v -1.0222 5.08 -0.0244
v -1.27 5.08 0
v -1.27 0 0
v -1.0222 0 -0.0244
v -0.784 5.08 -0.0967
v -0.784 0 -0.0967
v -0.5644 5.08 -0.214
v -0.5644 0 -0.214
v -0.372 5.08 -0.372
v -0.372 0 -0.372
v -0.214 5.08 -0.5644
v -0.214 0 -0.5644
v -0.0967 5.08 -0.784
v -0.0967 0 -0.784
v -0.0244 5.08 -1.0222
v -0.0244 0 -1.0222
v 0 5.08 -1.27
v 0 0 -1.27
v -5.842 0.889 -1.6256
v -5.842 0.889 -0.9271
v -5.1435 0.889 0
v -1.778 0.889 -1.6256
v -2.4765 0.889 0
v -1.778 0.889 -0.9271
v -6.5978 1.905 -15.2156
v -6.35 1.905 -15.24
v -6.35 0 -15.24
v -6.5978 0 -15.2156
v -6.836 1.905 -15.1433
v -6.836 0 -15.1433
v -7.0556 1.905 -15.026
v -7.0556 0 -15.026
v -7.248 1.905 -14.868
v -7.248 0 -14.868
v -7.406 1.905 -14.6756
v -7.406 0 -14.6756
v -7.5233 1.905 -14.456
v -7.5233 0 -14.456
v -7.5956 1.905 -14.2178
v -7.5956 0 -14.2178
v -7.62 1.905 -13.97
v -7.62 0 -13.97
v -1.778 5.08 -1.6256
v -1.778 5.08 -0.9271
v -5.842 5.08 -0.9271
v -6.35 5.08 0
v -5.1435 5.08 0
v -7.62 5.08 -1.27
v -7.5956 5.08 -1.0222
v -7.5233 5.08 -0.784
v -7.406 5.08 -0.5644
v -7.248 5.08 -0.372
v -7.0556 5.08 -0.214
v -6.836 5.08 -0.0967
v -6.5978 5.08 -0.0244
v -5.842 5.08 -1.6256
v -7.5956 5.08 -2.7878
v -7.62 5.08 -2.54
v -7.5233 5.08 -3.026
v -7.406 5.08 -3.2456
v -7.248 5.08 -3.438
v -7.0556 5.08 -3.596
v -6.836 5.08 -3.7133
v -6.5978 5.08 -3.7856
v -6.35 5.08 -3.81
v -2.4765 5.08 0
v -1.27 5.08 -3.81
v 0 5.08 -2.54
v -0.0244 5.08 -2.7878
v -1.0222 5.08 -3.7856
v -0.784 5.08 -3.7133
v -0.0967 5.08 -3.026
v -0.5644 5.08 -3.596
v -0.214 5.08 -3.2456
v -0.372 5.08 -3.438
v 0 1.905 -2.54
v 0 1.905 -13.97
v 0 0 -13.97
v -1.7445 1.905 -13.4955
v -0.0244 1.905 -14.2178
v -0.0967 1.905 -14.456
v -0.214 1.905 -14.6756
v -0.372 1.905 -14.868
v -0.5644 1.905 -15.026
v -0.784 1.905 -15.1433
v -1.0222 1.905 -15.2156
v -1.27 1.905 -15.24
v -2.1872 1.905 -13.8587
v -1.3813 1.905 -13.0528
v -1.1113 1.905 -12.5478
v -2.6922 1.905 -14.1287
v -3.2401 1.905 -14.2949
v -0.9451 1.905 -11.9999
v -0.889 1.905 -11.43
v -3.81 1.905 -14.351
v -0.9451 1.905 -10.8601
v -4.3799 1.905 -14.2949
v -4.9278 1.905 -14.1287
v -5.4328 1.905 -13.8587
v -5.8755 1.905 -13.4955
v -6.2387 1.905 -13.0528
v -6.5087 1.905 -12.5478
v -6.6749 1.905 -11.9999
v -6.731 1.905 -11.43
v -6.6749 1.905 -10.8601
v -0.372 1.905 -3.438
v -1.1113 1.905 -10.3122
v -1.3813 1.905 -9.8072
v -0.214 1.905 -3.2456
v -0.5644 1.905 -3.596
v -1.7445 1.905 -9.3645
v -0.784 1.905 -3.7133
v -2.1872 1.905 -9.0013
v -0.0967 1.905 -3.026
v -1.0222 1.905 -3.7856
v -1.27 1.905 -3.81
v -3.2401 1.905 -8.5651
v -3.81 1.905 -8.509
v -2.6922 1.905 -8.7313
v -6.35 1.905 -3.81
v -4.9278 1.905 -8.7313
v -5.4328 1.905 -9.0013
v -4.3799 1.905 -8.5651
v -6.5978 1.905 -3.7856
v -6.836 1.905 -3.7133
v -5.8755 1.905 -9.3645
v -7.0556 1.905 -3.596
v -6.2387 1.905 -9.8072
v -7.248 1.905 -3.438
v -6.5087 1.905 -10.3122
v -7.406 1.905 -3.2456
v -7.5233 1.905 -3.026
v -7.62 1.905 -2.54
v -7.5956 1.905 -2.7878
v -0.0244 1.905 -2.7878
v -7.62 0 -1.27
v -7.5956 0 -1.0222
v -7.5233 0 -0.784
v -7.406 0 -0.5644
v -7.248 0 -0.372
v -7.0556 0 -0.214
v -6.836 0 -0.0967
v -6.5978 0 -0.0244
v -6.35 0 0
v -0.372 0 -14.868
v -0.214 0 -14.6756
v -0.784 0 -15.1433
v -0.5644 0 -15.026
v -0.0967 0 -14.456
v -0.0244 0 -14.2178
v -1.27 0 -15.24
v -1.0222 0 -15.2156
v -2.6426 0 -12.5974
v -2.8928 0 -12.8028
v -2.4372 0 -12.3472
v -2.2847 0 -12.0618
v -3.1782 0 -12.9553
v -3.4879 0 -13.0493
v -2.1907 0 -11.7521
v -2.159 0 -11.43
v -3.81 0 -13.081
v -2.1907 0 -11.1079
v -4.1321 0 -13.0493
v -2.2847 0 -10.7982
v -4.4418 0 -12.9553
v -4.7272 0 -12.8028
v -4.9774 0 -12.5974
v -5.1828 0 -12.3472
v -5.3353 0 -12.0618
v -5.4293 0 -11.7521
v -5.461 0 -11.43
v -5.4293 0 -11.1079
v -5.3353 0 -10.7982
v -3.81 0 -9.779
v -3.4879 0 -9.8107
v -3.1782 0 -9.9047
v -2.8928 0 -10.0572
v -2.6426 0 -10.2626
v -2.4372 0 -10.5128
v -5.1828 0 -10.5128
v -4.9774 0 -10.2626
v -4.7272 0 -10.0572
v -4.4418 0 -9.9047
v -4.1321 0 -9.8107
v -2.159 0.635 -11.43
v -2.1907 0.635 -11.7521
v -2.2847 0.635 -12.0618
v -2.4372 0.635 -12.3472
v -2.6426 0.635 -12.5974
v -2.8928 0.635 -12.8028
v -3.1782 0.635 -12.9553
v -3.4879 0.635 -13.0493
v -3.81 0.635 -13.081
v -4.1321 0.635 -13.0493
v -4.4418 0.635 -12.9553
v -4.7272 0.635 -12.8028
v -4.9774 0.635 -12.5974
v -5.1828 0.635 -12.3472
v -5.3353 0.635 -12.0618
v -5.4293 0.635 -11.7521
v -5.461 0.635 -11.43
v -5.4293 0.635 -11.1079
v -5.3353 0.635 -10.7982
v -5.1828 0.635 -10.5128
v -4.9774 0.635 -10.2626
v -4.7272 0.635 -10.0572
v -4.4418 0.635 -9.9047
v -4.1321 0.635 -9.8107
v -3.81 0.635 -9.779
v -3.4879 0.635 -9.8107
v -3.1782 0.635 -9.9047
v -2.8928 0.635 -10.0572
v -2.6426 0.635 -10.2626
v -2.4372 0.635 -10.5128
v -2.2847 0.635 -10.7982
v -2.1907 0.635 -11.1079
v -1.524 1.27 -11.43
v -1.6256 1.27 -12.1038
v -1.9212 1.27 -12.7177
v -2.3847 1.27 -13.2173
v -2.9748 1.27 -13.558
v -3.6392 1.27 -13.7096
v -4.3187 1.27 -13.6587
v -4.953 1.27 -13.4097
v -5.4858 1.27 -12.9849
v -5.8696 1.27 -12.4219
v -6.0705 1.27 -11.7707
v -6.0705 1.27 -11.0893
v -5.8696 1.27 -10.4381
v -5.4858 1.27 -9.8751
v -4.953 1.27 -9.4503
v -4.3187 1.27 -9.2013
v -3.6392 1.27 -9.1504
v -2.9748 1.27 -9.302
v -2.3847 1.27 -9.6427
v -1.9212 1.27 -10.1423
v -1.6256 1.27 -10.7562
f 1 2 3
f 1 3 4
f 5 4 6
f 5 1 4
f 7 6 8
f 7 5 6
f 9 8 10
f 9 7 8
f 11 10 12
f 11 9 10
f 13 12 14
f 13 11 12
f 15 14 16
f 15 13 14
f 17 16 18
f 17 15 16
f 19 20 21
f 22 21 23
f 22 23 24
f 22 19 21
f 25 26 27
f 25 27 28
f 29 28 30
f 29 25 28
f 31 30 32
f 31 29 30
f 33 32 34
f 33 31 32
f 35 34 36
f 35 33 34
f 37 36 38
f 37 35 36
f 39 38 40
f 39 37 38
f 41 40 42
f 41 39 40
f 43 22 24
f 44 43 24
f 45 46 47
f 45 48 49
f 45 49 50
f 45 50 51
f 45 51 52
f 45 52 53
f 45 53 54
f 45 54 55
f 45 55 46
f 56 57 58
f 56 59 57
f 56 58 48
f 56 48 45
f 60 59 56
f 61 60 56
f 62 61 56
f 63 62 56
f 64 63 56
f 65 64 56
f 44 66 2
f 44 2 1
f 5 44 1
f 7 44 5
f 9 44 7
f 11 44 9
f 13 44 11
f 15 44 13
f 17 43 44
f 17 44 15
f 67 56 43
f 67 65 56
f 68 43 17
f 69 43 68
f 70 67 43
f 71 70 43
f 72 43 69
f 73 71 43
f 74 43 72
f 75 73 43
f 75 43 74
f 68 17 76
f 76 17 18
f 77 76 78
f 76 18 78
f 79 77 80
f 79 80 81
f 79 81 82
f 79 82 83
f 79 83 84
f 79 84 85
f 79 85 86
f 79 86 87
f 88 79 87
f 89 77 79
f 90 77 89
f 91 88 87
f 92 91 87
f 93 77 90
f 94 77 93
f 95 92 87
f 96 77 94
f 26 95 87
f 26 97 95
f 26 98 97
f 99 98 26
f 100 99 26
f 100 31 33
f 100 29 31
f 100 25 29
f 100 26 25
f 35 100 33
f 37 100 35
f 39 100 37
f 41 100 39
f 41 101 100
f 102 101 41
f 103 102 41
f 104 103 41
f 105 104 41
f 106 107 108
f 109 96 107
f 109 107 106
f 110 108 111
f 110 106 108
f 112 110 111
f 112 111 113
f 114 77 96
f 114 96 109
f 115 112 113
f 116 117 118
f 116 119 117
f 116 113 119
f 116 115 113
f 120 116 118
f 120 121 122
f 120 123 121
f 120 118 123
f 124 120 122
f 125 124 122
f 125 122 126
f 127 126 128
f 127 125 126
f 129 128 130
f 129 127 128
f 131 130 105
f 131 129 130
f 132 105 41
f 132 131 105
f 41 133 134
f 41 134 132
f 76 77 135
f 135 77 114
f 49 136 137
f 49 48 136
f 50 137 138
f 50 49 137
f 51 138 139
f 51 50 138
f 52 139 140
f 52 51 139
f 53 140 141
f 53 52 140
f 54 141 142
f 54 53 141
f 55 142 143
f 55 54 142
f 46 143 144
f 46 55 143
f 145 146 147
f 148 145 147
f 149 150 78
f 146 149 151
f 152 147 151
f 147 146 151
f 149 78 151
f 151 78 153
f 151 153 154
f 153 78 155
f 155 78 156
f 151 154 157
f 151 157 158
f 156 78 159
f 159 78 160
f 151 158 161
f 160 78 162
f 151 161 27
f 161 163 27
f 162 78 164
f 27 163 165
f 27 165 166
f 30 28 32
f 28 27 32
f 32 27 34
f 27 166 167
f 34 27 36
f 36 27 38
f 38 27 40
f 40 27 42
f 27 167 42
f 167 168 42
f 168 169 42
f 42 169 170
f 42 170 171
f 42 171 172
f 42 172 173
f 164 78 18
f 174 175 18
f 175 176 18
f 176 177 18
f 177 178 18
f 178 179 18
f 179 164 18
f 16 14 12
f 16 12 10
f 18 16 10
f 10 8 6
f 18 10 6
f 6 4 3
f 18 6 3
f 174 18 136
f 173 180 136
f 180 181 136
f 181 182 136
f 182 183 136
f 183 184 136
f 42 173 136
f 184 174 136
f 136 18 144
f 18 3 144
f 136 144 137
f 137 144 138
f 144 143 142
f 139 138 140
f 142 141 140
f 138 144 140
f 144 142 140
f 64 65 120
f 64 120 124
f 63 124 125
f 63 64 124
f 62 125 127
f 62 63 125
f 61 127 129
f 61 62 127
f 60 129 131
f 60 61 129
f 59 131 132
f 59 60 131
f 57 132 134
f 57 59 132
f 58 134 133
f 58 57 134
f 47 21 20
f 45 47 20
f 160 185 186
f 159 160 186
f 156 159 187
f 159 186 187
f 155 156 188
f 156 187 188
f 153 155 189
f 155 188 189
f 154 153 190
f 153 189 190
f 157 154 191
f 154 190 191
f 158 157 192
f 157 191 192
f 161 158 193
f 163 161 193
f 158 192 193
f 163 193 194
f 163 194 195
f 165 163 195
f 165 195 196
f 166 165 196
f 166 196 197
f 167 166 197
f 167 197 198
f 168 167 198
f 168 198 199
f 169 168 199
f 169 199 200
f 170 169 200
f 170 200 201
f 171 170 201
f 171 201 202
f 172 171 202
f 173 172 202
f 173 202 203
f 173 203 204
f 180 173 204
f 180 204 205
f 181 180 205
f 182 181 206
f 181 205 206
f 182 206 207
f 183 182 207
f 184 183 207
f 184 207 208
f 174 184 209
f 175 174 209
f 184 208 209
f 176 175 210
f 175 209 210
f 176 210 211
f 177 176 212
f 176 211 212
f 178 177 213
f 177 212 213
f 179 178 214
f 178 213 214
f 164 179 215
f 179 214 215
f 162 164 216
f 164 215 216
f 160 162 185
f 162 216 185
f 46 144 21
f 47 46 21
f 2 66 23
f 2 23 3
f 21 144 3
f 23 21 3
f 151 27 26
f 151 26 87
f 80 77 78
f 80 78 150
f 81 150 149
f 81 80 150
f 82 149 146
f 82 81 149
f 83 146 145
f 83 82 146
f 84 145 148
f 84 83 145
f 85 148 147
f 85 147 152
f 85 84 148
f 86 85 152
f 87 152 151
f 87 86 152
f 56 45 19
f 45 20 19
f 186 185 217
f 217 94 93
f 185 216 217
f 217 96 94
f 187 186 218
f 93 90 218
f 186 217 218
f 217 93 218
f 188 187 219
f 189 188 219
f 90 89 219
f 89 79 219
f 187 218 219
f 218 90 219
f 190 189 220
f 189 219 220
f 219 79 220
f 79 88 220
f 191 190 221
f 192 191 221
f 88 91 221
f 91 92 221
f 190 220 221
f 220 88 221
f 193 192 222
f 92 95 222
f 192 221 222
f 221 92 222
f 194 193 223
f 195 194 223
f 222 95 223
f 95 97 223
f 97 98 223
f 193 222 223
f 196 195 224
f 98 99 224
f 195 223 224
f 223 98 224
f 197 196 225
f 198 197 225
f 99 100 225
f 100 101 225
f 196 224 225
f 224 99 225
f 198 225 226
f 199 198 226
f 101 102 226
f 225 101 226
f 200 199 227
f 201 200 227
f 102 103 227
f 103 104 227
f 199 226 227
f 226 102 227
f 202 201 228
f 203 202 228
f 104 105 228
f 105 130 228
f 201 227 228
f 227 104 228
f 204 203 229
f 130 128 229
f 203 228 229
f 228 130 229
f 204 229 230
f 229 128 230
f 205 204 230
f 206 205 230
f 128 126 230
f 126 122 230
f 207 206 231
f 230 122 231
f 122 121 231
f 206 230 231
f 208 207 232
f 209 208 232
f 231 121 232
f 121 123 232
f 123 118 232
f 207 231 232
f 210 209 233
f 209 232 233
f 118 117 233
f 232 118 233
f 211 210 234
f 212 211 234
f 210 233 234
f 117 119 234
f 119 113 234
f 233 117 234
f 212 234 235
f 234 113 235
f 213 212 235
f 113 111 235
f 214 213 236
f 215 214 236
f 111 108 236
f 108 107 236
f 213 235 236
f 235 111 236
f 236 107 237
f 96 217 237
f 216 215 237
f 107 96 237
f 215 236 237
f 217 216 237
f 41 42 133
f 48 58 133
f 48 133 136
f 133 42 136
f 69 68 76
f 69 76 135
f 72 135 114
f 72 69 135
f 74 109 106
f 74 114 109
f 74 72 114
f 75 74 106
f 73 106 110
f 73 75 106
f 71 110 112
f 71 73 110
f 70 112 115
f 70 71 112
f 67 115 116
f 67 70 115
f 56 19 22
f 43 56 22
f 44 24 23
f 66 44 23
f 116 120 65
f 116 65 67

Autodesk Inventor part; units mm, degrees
ref_plane "YZ Plane" through (0, 0, 0) normal (1, 0, 0) x (0, 1, 0)
ref_plane "XZ Plane" through (0, 0, 0) normal (0, 1, 0) x (-1, 0, 0)
ref_plane "XY Plane" through (0, 0, 0) normal (0, 0, 1) x (1, 0, 0)
sketch "Sketch1" plane through (0, 0, 0) normal (0, 1, 0) x (-1, 0, 0)
  line L0 (0, 0) -> (7.62, 0)
  line L1 (7.62, 0) -> (7.62, -15.24)
  line L2 (7.62, -15.24) -> (0, -15.24)
  line L3 (0, -15.24) -> (0, 0)
  dimension "d0" = 7.62
  dimension "d1" = 15.24
extrude "Extrusion1" add sketch "Sketch1" along normal blind 1.905
sketch "Sketch4" plane through (0, 1.905, 0) normal (0, 1, 0) x (1, 0, 0)
  line L0 (0, 15.24) -> (-7.62, 15.24) projected
  circle A0 centre (-3.81, 11.43) radius 1.651
  point P0 (0, 0)
  point P1 (-3.81, 15.24)
  dimension "d9" = 3.302
  dimension "d10" = 3.81
extrude "Extrusion3" cut sketch "Sketch4" against normal through all
chamfer "Chamfer1" distance 1.27 angle 45 1 edges at (-5.461, 1.905, -11.43)
sketch "Sketch5" plane through (0, 1.905, 0) normal (0, 1, 0) x (1, 0, 0)
  line L0 (-7.62, 0) -> (0, 0) projected
  line L1 (0, 0) -> (0, 15.24) projected
  line L2 (0, 15.24) -> (-7.62, 15.24) projected
  line L3 (-7.62, 15.24) -> (-7.62, 0) projected
  circle A0 centre (-3.81, 11.43) radius 2.921 projected
  line L4 (0, 0) -> (-7.62, 0) projected
  line L5 (-5.1435, 0) -> (-5.842, 0.9271)
  line L6 (-5.842, 0.9271) -> (-5.842, 1.6256)
  line L7 (-5.842, 1.6256) -> (-1.778, 1.6256)
  line L8 (-1.778, 1.6256) -> (-1.778, 0.9271)
  line L9 (-1.778, 0.9271) -> (-2.4765, 0)
  line L10 (-7.62, 0) -> (-7.62, 15.24) projected
  line L11 (-7.62, 3.81) -> (0, 3.81)
  point P0 (-3.81, 1.6256)
  point P1 (-3.81, 3.81)
  dimension "d19" = 2.667
  dimension "d20" = 4.064
  dimension "d21" = 0.9271
  dimension "d23" = 1.6256
  dimension "d24" = 3.81
extrude "Extrusion4" add sketch "Sketch5" along normal blind 3.175 contours L3 L11 L1 L0 L9 L8 L7 L6 L5
fillet "Fillet2" radius 1.27 6 edges at (-7.62, 2.54, 0) (0, 2.54, 0) (0, 3.4925, -3.81) (-7.62, 3.4925, -3.81) (-7.62, 0.9525, -15.24) (0, 0.9525, -15.24)
sketch "Sketch6" plane through (0, 1.905, 0) normal (0, 1, 0) x (1, 0, 0)
  line L0 (-2.4765, 0) -> (-1.778, 0.9271) projected
  line L1 (-1.778, 0.9271) -> (-1.778, 1.6256) projected
  line L2 (-1.778, 1.6256) -> (-5.842, 1.6256) projected
  line L3 (-5.842, 1.6256) -> (-5.842, 0.9271) projected
  line L4 (-5.842, 0.9271) -> (-5.1435, 0) projected
  line L5 (-5.1435, 0) -> (-2.4765, 0) projected
  point P0 (0, 0)
extrude "Extrusion5" cut sketch "Sketch6" against normal blind 1.016
properties part number "HallEffectSpoolSensorMount" material "ABS Plastic"
